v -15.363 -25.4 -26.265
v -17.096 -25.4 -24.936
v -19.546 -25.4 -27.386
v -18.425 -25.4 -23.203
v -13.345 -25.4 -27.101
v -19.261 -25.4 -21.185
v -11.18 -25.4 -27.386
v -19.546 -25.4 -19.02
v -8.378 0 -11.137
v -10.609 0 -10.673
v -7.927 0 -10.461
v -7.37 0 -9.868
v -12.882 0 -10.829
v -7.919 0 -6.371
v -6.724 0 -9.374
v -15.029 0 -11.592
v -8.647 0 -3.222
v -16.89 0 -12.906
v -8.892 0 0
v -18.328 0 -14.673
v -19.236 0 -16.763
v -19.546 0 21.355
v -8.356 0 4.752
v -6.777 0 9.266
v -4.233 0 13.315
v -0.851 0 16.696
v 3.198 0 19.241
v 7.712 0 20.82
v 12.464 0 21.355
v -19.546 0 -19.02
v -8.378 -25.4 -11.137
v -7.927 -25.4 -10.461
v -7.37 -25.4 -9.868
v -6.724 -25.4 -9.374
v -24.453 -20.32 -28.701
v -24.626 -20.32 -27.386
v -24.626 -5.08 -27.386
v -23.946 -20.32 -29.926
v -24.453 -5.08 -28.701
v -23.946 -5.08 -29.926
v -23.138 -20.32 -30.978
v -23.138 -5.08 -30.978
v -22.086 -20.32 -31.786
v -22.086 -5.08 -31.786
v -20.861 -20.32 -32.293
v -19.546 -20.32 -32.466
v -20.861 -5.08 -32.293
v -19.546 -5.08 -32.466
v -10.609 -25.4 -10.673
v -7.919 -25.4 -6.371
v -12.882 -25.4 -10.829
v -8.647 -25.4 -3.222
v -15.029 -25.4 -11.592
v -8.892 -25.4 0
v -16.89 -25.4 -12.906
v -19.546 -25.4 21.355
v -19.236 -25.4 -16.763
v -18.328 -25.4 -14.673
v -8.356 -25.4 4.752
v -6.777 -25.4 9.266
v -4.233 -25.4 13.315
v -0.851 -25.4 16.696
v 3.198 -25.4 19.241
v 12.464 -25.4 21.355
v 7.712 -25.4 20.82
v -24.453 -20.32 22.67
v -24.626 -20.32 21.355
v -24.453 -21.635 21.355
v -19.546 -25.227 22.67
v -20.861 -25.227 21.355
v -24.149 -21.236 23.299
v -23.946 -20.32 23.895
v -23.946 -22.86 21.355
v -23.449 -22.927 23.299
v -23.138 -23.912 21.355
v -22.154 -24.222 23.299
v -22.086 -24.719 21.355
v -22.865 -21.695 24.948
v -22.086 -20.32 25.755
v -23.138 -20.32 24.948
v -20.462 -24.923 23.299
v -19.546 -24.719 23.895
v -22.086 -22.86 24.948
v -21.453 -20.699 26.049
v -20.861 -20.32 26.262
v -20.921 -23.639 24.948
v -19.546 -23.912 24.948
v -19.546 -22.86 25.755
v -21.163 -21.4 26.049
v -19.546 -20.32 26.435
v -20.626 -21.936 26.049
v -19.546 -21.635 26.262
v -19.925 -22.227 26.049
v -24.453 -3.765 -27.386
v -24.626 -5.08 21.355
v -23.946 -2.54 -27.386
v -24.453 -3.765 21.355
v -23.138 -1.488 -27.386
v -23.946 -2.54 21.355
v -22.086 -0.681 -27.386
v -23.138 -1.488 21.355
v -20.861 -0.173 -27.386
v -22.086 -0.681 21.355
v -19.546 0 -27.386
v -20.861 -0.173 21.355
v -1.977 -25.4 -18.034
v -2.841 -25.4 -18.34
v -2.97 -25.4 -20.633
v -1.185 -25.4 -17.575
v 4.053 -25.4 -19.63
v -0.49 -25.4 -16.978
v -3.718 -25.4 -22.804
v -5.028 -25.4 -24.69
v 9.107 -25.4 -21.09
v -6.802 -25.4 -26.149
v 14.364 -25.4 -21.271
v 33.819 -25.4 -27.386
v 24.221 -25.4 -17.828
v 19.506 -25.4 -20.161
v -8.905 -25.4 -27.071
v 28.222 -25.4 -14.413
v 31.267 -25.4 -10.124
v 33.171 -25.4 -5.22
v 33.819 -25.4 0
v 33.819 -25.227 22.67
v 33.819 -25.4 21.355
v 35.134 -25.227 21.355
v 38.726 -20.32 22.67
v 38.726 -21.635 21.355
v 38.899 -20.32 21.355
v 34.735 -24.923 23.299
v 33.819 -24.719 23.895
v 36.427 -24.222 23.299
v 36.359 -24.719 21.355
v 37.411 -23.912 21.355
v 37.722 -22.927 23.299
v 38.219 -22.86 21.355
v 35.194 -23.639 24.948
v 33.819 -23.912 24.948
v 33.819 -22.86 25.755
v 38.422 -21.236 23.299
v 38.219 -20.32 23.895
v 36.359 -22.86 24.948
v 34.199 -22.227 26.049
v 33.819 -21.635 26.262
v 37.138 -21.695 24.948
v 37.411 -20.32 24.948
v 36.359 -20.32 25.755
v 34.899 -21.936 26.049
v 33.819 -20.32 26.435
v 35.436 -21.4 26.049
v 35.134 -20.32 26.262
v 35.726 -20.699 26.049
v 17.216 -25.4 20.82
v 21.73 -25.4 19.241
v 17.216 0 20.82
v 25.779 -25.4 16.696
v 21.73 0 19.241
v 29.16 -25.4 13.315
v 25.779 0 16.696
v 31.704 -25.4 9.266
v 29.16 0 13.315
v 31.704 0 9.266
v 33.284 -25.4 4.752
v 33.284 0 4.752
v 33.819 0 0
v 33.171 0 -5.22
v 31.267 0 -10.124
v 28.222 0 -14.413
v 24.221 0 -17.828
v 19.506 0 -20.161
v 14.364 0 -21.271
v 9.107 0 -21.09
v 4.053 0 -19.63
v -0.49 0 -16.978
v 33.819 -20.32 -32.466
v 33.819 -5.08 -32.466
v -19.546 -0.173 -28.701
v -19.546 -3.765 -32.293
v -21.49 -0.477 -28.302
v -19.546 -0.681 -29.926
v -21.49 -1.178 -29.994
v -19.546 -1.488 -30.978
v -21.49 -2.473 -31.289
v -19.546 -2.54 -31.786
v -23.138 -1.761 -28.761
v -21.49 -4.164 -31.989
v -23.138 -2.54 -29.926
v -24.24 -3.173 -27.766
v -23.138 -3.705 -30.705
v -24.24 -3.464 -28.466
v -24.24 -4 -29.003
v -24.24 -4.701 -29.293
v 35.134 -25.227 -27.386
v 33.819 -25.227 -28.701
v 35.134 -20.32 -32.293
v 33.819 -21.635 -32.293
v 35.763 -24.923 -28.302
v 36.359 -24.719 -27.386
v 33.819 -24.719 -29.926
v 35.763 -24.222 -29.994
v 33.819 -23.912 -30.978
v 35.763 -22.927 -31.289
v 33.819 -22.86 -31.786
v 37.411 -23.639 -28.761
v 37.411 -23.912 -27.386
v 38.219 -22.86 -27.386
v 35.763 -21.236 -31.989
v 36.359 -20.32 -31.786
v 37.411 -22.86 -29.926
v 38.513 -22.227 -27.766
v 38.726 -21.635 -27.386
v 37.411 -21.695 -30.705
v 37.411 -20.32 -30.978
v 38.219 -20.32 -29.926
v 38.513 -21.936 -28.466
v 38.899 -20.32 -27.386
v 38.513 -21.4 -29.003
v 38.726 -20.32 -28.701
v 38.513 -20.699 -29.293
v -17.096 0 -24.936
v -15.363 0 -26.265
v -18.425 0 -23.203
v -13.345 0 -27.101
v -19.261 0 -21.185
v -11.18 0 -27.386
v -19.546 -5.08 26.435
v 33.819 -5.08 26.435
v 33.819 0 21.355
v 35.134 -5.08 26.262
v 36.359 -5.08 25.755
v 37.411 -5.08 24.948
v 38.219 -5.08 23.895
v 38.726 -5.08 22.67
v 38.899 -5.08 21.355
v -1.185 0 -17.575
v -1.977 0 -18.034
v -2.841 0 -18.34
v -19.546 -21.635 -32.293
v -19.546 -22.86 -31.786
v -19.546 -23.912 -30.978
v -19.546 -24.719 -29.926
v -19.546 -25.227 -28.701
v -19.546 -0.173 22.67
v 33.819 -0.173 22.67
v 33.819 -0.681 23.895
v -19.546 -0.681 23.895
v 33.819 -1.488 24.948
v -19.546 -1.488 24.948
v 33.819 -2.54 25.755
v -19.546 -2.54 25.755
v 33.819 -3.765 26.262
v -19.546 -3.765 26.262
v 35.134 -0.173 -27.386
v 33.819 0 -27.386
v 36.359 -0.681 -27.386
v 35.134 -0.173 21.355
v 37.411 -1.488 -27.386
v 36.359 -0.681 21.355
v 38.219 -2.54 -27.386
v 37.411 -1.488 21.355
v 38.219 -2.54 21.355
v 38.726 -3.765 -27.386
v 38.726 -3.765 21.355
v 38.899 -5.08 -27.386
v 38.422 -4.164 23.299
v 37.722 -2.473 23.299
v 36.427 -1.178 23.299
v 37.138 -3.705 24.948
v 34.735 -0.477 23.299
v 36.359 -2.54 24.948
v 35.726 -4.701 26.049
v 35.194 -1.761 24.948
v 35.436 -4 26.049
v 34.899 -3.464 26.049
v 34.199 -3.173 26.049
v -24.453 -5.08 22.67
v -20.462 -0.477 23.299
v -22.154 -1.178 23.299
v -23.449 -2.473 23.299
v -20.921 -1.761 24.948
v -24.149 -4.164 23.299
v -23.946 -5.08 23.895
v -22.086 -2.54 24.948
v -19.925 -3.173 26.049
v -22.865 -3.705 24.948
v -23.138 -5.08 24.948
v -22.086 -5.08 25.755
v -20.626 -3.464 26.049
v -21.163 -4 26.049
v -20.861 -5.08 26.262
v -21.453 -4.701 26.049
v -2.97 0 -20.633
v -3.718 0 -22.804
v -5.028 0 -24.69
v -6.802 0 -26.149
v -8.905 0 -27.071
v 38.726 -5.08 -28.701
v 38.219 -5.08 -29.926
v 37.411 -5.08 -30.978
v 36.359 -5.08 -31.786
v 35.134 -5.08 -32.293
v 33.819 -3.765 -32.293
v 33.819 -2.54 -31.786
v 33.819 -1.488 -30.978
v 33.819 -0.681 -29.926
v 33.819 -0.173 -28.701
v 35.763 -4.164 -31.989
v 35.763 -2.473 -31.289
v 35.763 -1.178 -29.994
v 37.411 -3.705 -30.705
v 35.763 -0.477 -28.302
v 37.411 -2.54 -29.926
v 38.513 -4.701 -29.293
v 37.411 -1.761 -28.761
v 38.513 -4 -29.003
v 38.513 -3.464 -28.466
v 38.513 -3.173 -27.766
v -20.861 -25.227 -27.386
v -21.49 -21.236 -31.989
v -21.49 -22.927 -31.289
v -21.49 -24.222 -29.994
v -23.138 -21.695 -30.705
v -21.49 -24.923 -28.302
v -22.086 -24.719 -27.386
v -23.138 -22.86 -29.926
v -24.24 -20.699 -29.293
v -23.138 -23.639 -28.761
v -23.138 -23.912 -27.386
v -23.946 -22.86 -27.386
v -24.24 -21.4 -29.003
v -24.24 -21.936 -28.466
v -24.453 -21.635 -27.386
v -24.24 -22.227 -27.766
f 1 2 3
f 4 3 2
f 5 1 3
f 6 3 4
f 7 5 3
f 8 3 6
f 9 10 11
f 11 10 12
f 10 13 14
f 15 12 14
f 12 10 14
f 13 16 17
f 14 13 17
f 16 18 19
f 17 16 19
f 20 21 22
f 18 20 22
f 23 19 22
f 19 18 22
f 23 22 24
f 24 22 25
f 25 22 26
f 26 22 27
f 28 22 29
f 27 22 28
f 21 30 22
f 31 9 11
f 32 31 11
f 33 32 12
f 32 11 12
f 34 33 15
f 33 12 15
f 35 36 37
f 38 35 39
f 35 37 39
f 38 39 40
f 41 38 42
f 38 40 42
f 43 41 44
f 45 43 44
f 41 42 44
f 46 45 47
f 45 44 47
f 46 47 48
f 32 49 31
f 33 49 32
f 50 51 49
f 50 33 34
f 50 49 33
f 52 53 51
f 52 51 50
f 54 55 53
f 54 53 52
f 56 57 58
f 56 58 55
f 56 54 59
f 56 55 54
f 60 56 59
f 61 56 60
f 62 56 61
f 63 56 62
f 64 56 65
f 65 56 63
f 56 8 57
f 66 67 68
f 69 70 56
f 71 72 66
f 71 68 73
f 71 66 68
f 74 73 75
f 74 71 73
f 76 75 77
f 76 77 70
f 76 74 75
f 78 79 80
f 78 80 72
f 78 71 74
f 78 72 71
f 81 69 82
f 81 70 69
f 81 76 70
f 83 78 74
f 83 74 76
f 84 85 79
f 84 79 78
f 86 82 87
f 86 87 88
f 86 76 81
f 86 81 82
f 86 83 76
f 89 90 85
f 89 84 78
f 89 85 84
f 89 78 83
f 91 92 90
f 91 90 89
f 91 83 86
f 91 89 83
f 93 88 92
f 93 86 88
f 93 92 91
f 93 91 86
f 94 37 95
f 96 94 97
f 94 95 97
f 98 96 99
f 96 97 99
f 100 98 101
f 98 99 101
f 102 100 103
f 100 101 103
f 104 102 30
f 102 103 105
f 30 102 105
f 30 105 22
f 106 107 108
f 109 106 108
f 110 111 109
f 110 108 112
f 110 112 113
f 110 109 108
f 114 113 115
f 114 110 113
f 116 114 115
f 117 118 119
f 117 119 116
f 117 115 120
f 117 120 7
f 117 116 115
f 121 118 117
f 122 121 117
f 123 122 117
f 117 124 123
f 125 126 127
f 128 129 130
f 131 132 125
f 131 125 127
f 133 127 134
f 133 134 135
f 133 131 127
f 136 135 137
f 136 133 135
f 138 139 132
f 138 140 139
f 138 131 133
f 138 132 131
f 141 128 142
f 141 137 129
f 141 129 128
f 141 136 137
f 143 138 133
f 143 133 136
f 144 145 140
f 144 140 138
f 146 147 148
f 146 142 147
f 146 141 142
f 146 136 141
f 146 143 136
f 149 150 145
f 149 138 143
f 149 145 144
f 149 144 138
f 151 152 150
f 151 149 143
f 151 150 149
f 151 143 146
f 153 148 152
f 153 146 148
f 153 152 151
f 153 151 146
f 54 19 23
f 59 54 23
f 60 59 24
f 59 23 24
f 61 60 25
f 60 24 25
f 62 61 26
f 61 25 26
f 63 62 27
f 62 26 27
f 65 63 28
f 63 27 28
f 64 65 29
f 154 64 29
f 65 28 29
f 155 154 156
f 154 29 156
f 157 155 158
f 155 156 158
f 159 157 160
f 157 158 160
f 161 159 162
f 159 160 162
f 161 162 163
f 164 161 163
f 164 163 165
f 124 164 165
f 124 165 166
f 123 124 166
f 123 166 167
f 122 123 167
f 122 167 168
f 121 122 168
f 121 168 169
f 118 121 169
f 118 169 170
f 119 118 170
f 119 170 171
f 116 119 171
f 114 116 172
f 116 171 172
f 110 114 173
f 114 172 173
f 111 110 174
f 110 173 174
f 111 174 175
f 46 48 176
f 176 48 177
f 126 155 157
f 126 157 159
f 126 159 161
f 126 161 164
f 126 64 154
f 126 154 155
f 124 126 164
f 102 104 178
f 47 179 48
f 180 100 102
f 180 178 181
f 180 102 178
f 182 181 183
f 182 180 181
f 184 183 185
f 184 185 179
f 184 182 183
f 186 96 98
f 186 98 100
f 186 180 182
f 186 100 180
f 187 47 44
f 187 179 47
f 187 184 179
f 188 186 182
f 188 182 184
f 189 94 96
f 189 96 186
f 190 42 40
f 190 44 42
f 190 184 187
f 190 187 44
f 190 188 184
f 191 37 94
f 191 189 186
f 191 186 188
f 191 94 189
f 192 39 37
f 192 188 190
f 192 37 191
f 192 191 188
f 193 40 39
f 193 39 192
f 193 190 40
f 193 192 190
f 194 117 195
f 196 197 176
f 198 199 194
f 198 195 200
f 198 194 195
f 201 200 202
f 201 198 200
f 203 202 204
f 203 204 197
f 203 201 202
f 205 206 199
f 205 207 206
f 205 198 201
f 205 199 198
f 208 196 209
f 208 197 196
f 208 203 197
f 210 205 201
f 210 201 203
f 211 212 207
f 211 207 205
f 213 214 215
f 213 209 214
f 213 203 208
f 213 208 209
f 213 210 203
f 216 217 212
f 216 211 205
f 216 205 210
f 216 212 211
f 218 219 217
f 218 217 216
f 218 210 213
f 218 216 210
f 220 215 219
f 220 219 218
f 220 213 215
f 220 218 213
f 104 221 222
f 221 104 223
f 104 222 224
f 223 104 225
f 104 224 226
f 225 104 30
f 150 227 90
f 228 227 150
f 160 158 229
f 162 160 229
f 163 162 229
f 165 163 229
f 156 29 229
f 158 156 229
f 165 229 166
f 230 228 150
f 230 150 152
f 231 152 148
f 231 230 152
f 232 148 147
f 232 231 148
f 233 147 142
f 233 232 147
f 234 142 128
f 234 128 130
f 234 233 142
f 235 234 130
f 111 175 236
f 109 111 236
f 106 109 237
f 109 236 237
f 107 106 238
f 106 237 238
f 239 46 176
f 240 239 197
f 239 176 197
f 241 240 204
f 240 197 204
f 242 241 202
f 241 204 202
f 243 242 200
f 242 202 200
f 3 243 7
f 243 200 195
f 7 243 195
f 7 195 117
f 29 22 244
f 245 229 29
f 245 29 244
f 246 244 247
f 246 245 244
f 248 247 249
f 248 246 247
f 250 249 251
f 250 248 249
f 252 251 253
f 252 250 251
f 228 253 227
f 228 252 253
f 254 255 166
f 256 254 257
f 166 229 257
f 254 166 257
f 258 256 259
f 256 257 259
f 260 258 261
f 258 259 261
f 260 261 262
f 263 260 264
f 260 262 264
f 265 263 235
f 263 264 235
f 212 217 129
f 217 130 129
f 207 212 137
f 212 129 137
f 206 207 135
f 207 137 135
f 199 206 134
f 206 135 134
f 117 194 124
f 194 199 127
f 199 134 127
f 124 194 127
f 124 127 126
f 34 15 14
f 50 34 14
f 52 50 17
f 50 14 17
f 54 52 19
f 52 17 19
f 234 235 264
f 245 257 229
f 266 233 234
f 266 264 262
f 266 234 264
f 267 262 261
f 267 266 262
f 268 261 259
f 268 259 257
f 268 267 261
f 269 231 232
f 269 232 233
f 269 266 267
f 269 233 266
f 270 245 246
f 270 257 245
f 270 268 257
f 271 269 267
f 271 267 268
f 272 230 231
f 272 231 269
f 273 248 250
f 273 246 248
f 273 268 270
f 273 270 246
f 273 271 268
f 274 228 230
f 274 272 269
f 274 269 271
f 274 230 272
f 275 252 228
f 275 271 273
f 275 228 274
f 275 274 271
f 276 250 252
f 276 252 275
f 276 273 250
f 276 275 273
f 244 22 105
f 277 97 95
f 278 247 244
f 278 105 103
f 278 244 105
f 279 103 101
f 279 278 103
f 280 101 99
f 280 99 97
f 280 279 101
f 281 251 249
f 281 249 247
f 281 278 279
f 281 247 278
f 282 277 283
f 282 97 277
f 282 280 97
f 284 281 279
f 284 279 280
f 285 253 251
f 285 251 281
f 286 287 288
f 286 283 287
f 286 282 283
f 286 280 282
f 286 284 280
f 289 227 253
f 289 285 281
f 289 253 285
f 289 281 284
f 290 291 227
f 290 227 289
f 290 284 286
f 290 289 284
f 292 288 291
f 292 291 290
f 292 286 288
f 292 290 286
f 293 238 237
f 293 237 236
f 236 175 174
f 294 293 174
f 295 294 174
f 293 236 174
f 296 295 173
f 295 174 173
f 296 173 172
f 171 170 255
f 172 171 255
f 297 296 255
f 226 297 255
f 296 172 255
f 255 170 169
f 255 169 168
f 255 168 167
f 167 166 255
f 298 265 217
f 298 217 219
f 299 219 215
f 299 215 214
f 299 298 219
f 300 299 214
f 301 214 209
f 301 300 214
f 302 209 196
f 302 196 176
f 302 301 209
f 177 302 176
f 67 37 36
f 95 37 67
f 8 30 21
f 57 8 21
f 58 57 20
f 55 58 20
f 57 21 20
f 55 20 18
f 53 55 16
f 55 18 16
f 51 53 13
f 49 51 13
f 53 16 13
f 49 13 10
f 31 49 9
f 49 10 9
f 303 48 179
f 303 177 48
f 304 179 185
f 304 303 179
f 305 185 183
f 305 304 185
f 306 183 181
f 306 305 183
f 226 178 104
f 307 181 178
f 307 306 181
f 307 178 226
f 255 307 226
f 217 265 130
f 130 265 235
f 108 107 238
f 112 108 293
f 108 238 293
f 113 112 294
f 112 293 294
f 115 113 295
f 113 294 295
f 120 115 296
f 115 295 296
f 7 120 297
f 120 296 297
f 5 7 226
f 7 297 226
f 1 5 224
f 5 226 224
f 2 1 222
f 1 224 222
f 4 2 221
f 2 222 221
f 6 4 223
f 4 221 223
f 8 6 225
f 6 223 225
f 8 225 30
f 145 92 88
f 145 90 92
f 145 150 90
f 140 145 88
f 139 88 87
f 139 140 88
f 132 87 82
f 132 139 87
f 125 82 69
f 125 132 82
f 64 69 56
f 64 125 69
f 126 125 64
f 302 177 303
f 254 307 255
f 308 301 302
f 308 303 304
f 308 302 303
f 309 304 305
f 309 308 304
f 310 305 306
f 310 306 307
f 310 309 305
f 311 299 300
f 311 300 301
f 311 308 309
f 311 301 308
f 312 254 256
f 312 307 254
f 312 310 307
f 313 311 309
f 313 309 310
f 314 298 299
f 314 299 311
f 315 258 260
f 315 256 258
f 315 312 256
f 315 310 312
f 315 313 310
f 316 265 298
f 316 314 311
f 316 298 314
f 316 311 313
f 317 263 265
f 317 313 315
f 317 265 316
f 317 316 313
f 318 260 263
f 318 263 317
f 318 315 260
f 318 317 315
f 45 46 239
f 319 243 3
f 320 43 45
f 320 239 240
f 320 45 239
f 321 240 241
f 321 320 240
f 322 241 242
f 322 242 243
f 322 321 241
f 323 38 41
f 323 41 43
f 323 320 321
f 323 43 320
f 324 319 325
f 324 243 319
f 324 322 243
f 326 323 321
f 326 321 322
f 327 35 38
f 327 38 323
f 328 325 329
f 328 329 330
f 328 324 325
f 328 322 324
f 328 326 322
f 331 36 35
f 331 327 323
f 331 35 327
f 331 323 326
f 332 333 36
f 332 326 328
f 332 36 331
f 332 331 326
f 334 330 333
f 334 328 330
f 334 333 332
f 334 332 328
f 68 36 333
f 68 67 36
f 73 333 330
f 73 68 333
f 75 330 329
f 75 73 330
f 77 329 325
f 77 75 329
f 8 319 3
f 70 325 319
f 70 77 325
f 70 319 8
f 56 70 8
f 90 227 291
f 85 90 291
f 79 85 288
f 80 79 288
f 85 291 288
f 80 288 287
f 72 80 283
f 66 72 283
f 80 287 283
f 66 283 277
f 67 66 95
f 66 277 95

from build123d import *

# Parameters (mm, degrees)
F0_W         = 63.5255295783
F0_H         = 58.9018370956
F1_DEPTH     = 25.4
F2_R         = 5.08
F3_R         = 5.08
F4_T1_DEPTH  = 15.24
F4_S5_W      = 5.08
F4_S5_H      = 5.08
F4_T6_DEPTH  = 5.08
F4_S11_W     = 5.08
F4_S11_H     = 5.08
F4_T12_DEPTH = 5.08
F4_S17_W     = 5.08
F4_S17_H     = 5.08
F4_T18_DEPTH = 5.08
F4_S23_W     = 5.08
F4_S23_H     = 5.08
F4_T24_DEPTH = 5.08
F4_S29_W     = 5.08
F4_S29_H     = 5.08
F4_T30_DEPTH = 5.08
F4_S35_W     = 5.08
F4_S35_H     = 5.08
F4_T36_DEPTH = 5.08
F4_S41_W     = 5.08
F4_S41_H     = 5.08
F4_T42_DEPTH = 5.08
F4_S47_W     = 5.08
F4_S47_H     = 5.08
F4_T48_DEPTH = 5.08
F6_DEPTH     = 25.401


# Not quite as in the source:
# - a fillet or chamfer that OpenCascade refuses, or shapes differently, is made with other operations: its cross-section is extruded or revolved along the edge and cut away or added


with BuildPart() as f1:
    # F0 (on Front) → F1 (new body)
    with BuildSketch(Plane.XZ):
        with Locations((7.1365712211, -3.0154520646)):
            Rectangle(F0_W, F0_H)
    extrude(amount=F1_DEPTH)

    # F2
    f2_edges = [f1.edges().sort_by_distance(p)[0] for p in [
        (7.136571, -25.4, 26.435466),
        (-24.626194, -25.4, -3.015452),
        (7.136571, -25.4, -32.466371),
        (38.899336, -25.4, -3.015452),
    ]]
    fillet(f2_edges, radius=F2_R)

    # F3
    f3_edges = [f1.edges().sort_by_distance(p)[0] for p in [
        (7.136571, 0, 26.435466),
        (38.899336, 0, -3.015452),
        (-24.626194, 0, -3.015452),
        (7.136571, 0, -32.466371),
    ]]
    fillet(f3_edges, radius=F3_R)

    # F4: fillet of radius 5.08 on 4 edges, made by hand

    # F4_s2 → F4_t1 (cut)
    with BuildSketch(Plane.XZ.offset(5.08)):
        with BuildLine():
            ThreePointArc((33.8193360102, 26.4354664832), (37.4114384586, 24.9475689317), (38.8993360102, 21.3554664832))
            Line((38.8993360102, 21.3554664832), (38.8993360102, 26.4354664832))
            Line((38.8993360102, 26.4354664832), (33.8193360102, 26.4354664832))
        make_face()
        with BuildLine():
            ThreePointArc((38.8993360102, -27.3863706124), (37.4114384586, -30.9784730608), (33.8193360102, -32.4663706124))
            Line((33.8193360102, -32.4663706124), (38.8993360102, -32.4663706124))
            Line((38.8993360102, -32.4663706124), (38.8993360102, -27.3863706124))
        make_face()
        with BuildLine():
            ThreePointArc((-19.5461935681, 26.4354664832), (-23.1382960165, 24.9475689317), (-24.6261935681, 21.3554664832))
            Line((-24.6261935681, 21.3554664832), (-24.6261935681, 26.4354664832))
            Line((-24.6261935681, 26.4354664832), (-19.5461935681, 26.4354664832))
        make_face()
        with BuildLine():
            ThreePointArc((-24.6261935681, -27.3863706124), (-23.1382960165, -30.9784730608), (-19.5461935681, -32.4663706124))
            Line((-19.5461935681, -32.4663706124), (-24.6261935681, -32.4663706124))
            Line((-24.6261935681, -32.4663706124), (-24.6261935681, -27.3863706124))
        make_face()
    extrude(amount=F4_T1_DEPTH, mode=Mode.SUBTRACT)


with BuildPart() as f4_tool4:
    # F4_s5 → F4_t6 (new body)
    with BuildSketch(Plane.YZ.offset(-19.5461935681)):
        with Locations((-2.54, -29.9263706124)):
            Rectangle(F4_S5_W, F4_S5_H)
    extrude(amount=-F4_T6_DEPTH)

    # F4_s7 → F4_t8 (revolve, cut)
    with BuildSketch(Plane(origin=(-19.5461935681, -5.08, -27.3863706124), x_dir=(0, -0.7071067812, 0.7071067812), z_dir=(0, -0.7071067812, -0.7071067812))):
        with BuildLine():
            ThreePointArc((0, -5.08), (5.08, 0), (0, 5.08))
            Line((0, 5.08), (0, -5.08))
        make_face()
    revolve(axis=Axis((-19.5461935681, -5.08, -27.3863706124), (-1, 0, 0)), mode=Mode.SUBTRACT)


with BuildPart() as f1_1:
    add(f1.part)

    # F4_t3: cut F4_tool4
    add(f4_tool4.part, mode=Mode.SUBTRACT)


with BuildPart() as f4_tool10:
    # F4_s11 → F4_t12 (new body)
    with BuildSketch(Plane.YZ.offset(-19.5461935681)):
        with Locations((-22.86, -29.9263706124)):
            Rectangle(F4_S11_W, F4_S11_H)
    extrude(amount=-F4_T12_DEPTH)

    # F4_s13 → F4_t14 (revolve, cut)
    with BuildSketch(Plane(origin=(-19.5461935681, -20.32, -27.3863706124), x_dir=(0, 0.7071067812, 0.7071067812), z_dir=(0, -0.7071067812, 0.7071067812))):
        with BuildLine():
            ThreePointArc((0, -5.08), (5.08, 0), (0, 5.08))
            Line((0, 5.08), (0, -5.08))
        make_face()
    revolve(axis=Axis((-19.5461935681, -20.32, -27.3863706124), (-1, 0, 0)), mode=Mode.SUBTRACT)


with BuildPart() as f1_2:
    add(f1_1.part)

    # F4_t9: cut F4_tool10
    add(f4_tool10.part, mode=Mode.SUBTRACT)


with BuildPart() as f4_tool16:
    # F4_s17 → F4_t18 (new body)
    with BuildSketch(Plane.XY.offset(21.3554664832)):
        with Locations((-22.0861935681, -2.54)):
            Rectangle(F4_S17_W, F4_S17_H)
    extrude(amount=F4_T18_DEPTH)

    # F4_s19 → F4_t20 (revolve, cut)
    with BuildSketch(Plane(origin=(-19.5461935681, -5.08, 21.3554664832), x_dir=(0.7071067812, -0.7071067812, 0), z_dir=(-0.7071067812, -0.7071067812, 0))):
        with BuildLine():
            ThreePointArc((0, -5.08), (5.08, 0), (0, 5.08))
            Line((0, 5.08), (0, -5.08))
        make_face()
    revolve(axis=Axis((-19.5461935681, -5.08, 21.3554664832), (0, 0, 1)), mode=Mode.SUBTRACT)


with BuildPart() as f1_3:
    add(f1_2.part)

    # F4_t15: cut F4_tool16
    add(f4_tool16.part, mode=Mode.SUBTRACT)


with BuildPart() as f4_tool22:
    # F4_s23 → F4_t24 (new body)
    with BuildSketch(Plane.XY.offset(21.3554664832)):
        with Locations((-22.0861935681, -22.86)):
            Rectangle(F4_S23_W, F4_S23_H)
    extrude(amount=F4_T24_DEPTH)

    # F4_s25 → F4_t26 (revolve, cut)
    with BuildSketch(Plane(origin=(-19.5461935681, -20.32, 21.3554664832), x_dir=(0.7071067812, 0.7071067812, 0), z_dir=(0.7071067812, -0.7071067812, 0))):
        with BuildLine():
            ThreePointArc((0, -5.08), (5.08, 0), (0, 5.08))
            Line((0, 5.08), (0, -5.08))
        make_face()
    revolve(axis=Axis((-19.5461935681, -20.32, 21.3554664832), (0, 0, 1)), mode=Mode.SUBTRACT)


with BuildPart() as f1_4:
    add(f1_3.part)

    # F4_t21: cut F4_tool22
    add(f4_tool22.part, mode=Mode.SUBTRACT)


with BuildPart() as f4_tool28:
    # F4_s29 → F4_t30 (new body)
    with BuildSketch(Plane.YZ.offset(33.8193360102)):
        with Locations((-2.54, -29.9263706124)):
            Rectangle(F4_S29_W, F4_S29_H)
    extrude(amount=F4_T30_DEPTH)

    # F4_s31 → F4_t32 (revolve, cut)
    with BuildSketch(Plane(origin=(33.8193360102, -5.08, -27.3863706124), x_dir=(0, -0.7071067812, 0.7071067812), z_dir=(0, 0.7071067812, 0.7071067812))):
        with BuildLine():
            ThreePointArc((0, -5.08), (5.08, 0), (0, 5.08))
            Line((0, 5.08), (0, -5.08))
        make_face()
    revolve(axis=Axis((33.8193360102, -5.08, -27.3863706124), (1, 0, 0)), mode=Mode.SUBTRACT)


with BuildPart() as f1_5:
    add(f1_4.part)

    # F4_t27: cut F4_tool28
    add(f4_tool28.part, mode=Mode.SUBTRACT)


with BuildPart() as f4_tool34:
    # F4_s35 → F4_t36 (new body)
    with BuildSketch(Plane.YZ.offset(33.8193360102)):
        with Locations((-22.86, -29.9263706124)):
            Rectangle(F4_S35_W, F4_S35_H)
    extrude(amount=F4_T36_DEPTH)

    # F4_s37 → F4_t38 (revolve, cut)
    with BuildSketch(Plane(origin=(33.8193360102, -20.32, -27.3863706124), x_dir=(0, 0.7071067812, 0.7071067812), z_dir=(0, 0.7071067812, -0.7071067812))):
        with BuildLine():
            ThreePointArc((0, -5.08), (5.08, 0), (0, 5.08))
            Line((0, 5.08), (0, -5.08))
        make_face()
    revolve(axis=Axis((33.8193360102, -20.32, -27.3863706124), (1, 0, 0)), mode=Mode.SUBTRACT)


with BuildPart() as f1_6:
    add(f1_5.part)

    # F4_t33: cut F4_tool34
    add(f4_tool34.part, mode=Mode.SUBTRACT)


with BuildPart() as f4_tool40:
    # F4_s41 → F4_t42 (new body)
    with BuildSketch(Plane.XY.offset(21.3554664832)):
        with Locations((36.3593360102, -2.54)):
            Rectangle(F4_S41_W, F4_S41_H)
    extrude(amount=F4_T42_DEPTH)

    # F4_s43 → F4_t44 (revolve, cut)
    with BuildSketch(Plane(origin=(33.8193360102, -5.08, 21.3554664832), x_dir=(-0.7071067812, -0.7071067812, 0), z_dir=(-0.7071067812, 0.7071067812, 0))):
        with BuildLine():
            ThreePointArc((0, -5.08), (5.08, 0), (0, 5.08))
            Line((0, 5.08), (0, -5.08))
        make_face()
    revolve(axis=Axis((33.8193360102, -5.08, 21.3554664832), (0, 0, 1)), mode=Mode.SUBTRACT)


with BuildPart() as f1_7:
    add(f1_6.part)

    # F4_t39: cut F4_tool40
    add(f4_tool40.part, mode=Mode.SUBTRACT)


with BuildPart() as f4_tool46:
    # F4_s47 → F4_t48 (new body)
    with BuildSketch(Plane.XY.offset(21.3554664832)):
        with Locations((36.3593360102, -22.86)):
            Rectangle(F4_S47_W, F4_S47_H)
    extrude(amount=F4_T48_DEPTH)

    # F4_s49 → F4_t50 (revolve, cut)
    with BuildSketch(Plane(origin=(33.8193360102, -20.32, 21.3554664832), x_dir=(-0.7071067812, 0.7071067812, 0), z_dir=(0.7071067812, 0.7071067812, 0))):
        with BuildLine():
            ThreePointArc((0, -5.08), (5.08, 0), (0, 5.08))
            Line((0, 5.08), (0, -5.08))
        make_face()
    revolve(axis=Axis((33.8193360102, -20.32, 21.3554664832), (0, 0, 1)), mode=Mode.SUBTRACT)


with BuildPart() as f1_8:
    add(f1_7.part)

    # F4_t45: cut F4_tool46
    add(f4_tool46.part, mode=Mode.SUBTRACT)

    # F5 (on face) → F6 (cut, through all)
    with BuildSketch(Plane(origin=(0, 0, 0), x_dir=(-1, 0, 0), z_dir=(0, 1, 0))):
        with BuildLine():
            ThreePointArc((6.7243616166, -9.373779083), (8.3427349026, -4.8105260449), (8.8915969563, 0))
            ThreePointArc((8.8915969563, 0), (-31.6040146397, 9.4715782097), (0.4899266998, -16.978077395))
            ThreePointArc((0.4899266998, -16.978077395), (0.2228411144, -10.4012847151), (6.7243616166, -9.373779083))
        make_face()
        with BuildLine():
            ThreePointArc((6.7243616166, -9.373779083), (0.2228411144, -10.4012847151), (0.4899266998, -16.978077395))
            ThreePointArc((0.4899266998, -16.978077395), (4.0507851492, -13.5396502777), (6.7243616166, -9.373779083))
        make_face()
        with BuildLine():
            ThreePointArc((6.7243616166, -9.373779083), (4.0507851492, -13.5396502777), (0.4899266998, -16.978077395))
            ThreePointArc((0.4899266998, -16.978077395), (1.5703386286, -17.823326152), (2.8412431673, -18.3395984162))
            ThreePointArc((2.8412431673, -18.3395984162), (4.5469228112, -13.9210498797), (8.3783969439, -11.136679181))
            ThreePointArc((8.3783969439, -11.136679181), (7.6606485066, -10.152707633), (6.7243616166, -9.373779083))
        make_face()
        with BuildLine():
            ThreePointArc((9.0007845368, -13.5396502777), (7.0934206735, -17.4441173353), (2.8412431673, -18.3395984162))
            ThreePointArc((2.8412431673, -18.3395984162), (10.8393587072, -27.3794387001), (19.5461935681, -19.0200373308))
            ThreePointArc((19.5461935681, -19.0200373308), (16.0046689137, -12.1850717648), (8.3783969439, -11.136679181))
            ThreePointArc((8.3783969439, -11.136679181), (8.842662113, -12.2985180922), (9.0007845368, -13.5396502777))
        make_face()
        with BuildLine():
            ThreePointArc((8.3783969439, -11.136679181), (4.5469228112, -13.9210498797), (2.8412431673, -18.3395984162))
            ThreePointArc((2.8412431673, -18.3395984162), (7.0934206735, -17.4441173353), (9.0007845368, -13.5396502777))
            ThreePointArc((9.0007845368, -13.5396502777), (8.842662113, -12.2985180922), (8.3783969439, -11.136679181))
        make_face()
    extrude(amount=-F6_DEPTH, mode=Mode.SUBTRACT)


solid = f1_8.part
